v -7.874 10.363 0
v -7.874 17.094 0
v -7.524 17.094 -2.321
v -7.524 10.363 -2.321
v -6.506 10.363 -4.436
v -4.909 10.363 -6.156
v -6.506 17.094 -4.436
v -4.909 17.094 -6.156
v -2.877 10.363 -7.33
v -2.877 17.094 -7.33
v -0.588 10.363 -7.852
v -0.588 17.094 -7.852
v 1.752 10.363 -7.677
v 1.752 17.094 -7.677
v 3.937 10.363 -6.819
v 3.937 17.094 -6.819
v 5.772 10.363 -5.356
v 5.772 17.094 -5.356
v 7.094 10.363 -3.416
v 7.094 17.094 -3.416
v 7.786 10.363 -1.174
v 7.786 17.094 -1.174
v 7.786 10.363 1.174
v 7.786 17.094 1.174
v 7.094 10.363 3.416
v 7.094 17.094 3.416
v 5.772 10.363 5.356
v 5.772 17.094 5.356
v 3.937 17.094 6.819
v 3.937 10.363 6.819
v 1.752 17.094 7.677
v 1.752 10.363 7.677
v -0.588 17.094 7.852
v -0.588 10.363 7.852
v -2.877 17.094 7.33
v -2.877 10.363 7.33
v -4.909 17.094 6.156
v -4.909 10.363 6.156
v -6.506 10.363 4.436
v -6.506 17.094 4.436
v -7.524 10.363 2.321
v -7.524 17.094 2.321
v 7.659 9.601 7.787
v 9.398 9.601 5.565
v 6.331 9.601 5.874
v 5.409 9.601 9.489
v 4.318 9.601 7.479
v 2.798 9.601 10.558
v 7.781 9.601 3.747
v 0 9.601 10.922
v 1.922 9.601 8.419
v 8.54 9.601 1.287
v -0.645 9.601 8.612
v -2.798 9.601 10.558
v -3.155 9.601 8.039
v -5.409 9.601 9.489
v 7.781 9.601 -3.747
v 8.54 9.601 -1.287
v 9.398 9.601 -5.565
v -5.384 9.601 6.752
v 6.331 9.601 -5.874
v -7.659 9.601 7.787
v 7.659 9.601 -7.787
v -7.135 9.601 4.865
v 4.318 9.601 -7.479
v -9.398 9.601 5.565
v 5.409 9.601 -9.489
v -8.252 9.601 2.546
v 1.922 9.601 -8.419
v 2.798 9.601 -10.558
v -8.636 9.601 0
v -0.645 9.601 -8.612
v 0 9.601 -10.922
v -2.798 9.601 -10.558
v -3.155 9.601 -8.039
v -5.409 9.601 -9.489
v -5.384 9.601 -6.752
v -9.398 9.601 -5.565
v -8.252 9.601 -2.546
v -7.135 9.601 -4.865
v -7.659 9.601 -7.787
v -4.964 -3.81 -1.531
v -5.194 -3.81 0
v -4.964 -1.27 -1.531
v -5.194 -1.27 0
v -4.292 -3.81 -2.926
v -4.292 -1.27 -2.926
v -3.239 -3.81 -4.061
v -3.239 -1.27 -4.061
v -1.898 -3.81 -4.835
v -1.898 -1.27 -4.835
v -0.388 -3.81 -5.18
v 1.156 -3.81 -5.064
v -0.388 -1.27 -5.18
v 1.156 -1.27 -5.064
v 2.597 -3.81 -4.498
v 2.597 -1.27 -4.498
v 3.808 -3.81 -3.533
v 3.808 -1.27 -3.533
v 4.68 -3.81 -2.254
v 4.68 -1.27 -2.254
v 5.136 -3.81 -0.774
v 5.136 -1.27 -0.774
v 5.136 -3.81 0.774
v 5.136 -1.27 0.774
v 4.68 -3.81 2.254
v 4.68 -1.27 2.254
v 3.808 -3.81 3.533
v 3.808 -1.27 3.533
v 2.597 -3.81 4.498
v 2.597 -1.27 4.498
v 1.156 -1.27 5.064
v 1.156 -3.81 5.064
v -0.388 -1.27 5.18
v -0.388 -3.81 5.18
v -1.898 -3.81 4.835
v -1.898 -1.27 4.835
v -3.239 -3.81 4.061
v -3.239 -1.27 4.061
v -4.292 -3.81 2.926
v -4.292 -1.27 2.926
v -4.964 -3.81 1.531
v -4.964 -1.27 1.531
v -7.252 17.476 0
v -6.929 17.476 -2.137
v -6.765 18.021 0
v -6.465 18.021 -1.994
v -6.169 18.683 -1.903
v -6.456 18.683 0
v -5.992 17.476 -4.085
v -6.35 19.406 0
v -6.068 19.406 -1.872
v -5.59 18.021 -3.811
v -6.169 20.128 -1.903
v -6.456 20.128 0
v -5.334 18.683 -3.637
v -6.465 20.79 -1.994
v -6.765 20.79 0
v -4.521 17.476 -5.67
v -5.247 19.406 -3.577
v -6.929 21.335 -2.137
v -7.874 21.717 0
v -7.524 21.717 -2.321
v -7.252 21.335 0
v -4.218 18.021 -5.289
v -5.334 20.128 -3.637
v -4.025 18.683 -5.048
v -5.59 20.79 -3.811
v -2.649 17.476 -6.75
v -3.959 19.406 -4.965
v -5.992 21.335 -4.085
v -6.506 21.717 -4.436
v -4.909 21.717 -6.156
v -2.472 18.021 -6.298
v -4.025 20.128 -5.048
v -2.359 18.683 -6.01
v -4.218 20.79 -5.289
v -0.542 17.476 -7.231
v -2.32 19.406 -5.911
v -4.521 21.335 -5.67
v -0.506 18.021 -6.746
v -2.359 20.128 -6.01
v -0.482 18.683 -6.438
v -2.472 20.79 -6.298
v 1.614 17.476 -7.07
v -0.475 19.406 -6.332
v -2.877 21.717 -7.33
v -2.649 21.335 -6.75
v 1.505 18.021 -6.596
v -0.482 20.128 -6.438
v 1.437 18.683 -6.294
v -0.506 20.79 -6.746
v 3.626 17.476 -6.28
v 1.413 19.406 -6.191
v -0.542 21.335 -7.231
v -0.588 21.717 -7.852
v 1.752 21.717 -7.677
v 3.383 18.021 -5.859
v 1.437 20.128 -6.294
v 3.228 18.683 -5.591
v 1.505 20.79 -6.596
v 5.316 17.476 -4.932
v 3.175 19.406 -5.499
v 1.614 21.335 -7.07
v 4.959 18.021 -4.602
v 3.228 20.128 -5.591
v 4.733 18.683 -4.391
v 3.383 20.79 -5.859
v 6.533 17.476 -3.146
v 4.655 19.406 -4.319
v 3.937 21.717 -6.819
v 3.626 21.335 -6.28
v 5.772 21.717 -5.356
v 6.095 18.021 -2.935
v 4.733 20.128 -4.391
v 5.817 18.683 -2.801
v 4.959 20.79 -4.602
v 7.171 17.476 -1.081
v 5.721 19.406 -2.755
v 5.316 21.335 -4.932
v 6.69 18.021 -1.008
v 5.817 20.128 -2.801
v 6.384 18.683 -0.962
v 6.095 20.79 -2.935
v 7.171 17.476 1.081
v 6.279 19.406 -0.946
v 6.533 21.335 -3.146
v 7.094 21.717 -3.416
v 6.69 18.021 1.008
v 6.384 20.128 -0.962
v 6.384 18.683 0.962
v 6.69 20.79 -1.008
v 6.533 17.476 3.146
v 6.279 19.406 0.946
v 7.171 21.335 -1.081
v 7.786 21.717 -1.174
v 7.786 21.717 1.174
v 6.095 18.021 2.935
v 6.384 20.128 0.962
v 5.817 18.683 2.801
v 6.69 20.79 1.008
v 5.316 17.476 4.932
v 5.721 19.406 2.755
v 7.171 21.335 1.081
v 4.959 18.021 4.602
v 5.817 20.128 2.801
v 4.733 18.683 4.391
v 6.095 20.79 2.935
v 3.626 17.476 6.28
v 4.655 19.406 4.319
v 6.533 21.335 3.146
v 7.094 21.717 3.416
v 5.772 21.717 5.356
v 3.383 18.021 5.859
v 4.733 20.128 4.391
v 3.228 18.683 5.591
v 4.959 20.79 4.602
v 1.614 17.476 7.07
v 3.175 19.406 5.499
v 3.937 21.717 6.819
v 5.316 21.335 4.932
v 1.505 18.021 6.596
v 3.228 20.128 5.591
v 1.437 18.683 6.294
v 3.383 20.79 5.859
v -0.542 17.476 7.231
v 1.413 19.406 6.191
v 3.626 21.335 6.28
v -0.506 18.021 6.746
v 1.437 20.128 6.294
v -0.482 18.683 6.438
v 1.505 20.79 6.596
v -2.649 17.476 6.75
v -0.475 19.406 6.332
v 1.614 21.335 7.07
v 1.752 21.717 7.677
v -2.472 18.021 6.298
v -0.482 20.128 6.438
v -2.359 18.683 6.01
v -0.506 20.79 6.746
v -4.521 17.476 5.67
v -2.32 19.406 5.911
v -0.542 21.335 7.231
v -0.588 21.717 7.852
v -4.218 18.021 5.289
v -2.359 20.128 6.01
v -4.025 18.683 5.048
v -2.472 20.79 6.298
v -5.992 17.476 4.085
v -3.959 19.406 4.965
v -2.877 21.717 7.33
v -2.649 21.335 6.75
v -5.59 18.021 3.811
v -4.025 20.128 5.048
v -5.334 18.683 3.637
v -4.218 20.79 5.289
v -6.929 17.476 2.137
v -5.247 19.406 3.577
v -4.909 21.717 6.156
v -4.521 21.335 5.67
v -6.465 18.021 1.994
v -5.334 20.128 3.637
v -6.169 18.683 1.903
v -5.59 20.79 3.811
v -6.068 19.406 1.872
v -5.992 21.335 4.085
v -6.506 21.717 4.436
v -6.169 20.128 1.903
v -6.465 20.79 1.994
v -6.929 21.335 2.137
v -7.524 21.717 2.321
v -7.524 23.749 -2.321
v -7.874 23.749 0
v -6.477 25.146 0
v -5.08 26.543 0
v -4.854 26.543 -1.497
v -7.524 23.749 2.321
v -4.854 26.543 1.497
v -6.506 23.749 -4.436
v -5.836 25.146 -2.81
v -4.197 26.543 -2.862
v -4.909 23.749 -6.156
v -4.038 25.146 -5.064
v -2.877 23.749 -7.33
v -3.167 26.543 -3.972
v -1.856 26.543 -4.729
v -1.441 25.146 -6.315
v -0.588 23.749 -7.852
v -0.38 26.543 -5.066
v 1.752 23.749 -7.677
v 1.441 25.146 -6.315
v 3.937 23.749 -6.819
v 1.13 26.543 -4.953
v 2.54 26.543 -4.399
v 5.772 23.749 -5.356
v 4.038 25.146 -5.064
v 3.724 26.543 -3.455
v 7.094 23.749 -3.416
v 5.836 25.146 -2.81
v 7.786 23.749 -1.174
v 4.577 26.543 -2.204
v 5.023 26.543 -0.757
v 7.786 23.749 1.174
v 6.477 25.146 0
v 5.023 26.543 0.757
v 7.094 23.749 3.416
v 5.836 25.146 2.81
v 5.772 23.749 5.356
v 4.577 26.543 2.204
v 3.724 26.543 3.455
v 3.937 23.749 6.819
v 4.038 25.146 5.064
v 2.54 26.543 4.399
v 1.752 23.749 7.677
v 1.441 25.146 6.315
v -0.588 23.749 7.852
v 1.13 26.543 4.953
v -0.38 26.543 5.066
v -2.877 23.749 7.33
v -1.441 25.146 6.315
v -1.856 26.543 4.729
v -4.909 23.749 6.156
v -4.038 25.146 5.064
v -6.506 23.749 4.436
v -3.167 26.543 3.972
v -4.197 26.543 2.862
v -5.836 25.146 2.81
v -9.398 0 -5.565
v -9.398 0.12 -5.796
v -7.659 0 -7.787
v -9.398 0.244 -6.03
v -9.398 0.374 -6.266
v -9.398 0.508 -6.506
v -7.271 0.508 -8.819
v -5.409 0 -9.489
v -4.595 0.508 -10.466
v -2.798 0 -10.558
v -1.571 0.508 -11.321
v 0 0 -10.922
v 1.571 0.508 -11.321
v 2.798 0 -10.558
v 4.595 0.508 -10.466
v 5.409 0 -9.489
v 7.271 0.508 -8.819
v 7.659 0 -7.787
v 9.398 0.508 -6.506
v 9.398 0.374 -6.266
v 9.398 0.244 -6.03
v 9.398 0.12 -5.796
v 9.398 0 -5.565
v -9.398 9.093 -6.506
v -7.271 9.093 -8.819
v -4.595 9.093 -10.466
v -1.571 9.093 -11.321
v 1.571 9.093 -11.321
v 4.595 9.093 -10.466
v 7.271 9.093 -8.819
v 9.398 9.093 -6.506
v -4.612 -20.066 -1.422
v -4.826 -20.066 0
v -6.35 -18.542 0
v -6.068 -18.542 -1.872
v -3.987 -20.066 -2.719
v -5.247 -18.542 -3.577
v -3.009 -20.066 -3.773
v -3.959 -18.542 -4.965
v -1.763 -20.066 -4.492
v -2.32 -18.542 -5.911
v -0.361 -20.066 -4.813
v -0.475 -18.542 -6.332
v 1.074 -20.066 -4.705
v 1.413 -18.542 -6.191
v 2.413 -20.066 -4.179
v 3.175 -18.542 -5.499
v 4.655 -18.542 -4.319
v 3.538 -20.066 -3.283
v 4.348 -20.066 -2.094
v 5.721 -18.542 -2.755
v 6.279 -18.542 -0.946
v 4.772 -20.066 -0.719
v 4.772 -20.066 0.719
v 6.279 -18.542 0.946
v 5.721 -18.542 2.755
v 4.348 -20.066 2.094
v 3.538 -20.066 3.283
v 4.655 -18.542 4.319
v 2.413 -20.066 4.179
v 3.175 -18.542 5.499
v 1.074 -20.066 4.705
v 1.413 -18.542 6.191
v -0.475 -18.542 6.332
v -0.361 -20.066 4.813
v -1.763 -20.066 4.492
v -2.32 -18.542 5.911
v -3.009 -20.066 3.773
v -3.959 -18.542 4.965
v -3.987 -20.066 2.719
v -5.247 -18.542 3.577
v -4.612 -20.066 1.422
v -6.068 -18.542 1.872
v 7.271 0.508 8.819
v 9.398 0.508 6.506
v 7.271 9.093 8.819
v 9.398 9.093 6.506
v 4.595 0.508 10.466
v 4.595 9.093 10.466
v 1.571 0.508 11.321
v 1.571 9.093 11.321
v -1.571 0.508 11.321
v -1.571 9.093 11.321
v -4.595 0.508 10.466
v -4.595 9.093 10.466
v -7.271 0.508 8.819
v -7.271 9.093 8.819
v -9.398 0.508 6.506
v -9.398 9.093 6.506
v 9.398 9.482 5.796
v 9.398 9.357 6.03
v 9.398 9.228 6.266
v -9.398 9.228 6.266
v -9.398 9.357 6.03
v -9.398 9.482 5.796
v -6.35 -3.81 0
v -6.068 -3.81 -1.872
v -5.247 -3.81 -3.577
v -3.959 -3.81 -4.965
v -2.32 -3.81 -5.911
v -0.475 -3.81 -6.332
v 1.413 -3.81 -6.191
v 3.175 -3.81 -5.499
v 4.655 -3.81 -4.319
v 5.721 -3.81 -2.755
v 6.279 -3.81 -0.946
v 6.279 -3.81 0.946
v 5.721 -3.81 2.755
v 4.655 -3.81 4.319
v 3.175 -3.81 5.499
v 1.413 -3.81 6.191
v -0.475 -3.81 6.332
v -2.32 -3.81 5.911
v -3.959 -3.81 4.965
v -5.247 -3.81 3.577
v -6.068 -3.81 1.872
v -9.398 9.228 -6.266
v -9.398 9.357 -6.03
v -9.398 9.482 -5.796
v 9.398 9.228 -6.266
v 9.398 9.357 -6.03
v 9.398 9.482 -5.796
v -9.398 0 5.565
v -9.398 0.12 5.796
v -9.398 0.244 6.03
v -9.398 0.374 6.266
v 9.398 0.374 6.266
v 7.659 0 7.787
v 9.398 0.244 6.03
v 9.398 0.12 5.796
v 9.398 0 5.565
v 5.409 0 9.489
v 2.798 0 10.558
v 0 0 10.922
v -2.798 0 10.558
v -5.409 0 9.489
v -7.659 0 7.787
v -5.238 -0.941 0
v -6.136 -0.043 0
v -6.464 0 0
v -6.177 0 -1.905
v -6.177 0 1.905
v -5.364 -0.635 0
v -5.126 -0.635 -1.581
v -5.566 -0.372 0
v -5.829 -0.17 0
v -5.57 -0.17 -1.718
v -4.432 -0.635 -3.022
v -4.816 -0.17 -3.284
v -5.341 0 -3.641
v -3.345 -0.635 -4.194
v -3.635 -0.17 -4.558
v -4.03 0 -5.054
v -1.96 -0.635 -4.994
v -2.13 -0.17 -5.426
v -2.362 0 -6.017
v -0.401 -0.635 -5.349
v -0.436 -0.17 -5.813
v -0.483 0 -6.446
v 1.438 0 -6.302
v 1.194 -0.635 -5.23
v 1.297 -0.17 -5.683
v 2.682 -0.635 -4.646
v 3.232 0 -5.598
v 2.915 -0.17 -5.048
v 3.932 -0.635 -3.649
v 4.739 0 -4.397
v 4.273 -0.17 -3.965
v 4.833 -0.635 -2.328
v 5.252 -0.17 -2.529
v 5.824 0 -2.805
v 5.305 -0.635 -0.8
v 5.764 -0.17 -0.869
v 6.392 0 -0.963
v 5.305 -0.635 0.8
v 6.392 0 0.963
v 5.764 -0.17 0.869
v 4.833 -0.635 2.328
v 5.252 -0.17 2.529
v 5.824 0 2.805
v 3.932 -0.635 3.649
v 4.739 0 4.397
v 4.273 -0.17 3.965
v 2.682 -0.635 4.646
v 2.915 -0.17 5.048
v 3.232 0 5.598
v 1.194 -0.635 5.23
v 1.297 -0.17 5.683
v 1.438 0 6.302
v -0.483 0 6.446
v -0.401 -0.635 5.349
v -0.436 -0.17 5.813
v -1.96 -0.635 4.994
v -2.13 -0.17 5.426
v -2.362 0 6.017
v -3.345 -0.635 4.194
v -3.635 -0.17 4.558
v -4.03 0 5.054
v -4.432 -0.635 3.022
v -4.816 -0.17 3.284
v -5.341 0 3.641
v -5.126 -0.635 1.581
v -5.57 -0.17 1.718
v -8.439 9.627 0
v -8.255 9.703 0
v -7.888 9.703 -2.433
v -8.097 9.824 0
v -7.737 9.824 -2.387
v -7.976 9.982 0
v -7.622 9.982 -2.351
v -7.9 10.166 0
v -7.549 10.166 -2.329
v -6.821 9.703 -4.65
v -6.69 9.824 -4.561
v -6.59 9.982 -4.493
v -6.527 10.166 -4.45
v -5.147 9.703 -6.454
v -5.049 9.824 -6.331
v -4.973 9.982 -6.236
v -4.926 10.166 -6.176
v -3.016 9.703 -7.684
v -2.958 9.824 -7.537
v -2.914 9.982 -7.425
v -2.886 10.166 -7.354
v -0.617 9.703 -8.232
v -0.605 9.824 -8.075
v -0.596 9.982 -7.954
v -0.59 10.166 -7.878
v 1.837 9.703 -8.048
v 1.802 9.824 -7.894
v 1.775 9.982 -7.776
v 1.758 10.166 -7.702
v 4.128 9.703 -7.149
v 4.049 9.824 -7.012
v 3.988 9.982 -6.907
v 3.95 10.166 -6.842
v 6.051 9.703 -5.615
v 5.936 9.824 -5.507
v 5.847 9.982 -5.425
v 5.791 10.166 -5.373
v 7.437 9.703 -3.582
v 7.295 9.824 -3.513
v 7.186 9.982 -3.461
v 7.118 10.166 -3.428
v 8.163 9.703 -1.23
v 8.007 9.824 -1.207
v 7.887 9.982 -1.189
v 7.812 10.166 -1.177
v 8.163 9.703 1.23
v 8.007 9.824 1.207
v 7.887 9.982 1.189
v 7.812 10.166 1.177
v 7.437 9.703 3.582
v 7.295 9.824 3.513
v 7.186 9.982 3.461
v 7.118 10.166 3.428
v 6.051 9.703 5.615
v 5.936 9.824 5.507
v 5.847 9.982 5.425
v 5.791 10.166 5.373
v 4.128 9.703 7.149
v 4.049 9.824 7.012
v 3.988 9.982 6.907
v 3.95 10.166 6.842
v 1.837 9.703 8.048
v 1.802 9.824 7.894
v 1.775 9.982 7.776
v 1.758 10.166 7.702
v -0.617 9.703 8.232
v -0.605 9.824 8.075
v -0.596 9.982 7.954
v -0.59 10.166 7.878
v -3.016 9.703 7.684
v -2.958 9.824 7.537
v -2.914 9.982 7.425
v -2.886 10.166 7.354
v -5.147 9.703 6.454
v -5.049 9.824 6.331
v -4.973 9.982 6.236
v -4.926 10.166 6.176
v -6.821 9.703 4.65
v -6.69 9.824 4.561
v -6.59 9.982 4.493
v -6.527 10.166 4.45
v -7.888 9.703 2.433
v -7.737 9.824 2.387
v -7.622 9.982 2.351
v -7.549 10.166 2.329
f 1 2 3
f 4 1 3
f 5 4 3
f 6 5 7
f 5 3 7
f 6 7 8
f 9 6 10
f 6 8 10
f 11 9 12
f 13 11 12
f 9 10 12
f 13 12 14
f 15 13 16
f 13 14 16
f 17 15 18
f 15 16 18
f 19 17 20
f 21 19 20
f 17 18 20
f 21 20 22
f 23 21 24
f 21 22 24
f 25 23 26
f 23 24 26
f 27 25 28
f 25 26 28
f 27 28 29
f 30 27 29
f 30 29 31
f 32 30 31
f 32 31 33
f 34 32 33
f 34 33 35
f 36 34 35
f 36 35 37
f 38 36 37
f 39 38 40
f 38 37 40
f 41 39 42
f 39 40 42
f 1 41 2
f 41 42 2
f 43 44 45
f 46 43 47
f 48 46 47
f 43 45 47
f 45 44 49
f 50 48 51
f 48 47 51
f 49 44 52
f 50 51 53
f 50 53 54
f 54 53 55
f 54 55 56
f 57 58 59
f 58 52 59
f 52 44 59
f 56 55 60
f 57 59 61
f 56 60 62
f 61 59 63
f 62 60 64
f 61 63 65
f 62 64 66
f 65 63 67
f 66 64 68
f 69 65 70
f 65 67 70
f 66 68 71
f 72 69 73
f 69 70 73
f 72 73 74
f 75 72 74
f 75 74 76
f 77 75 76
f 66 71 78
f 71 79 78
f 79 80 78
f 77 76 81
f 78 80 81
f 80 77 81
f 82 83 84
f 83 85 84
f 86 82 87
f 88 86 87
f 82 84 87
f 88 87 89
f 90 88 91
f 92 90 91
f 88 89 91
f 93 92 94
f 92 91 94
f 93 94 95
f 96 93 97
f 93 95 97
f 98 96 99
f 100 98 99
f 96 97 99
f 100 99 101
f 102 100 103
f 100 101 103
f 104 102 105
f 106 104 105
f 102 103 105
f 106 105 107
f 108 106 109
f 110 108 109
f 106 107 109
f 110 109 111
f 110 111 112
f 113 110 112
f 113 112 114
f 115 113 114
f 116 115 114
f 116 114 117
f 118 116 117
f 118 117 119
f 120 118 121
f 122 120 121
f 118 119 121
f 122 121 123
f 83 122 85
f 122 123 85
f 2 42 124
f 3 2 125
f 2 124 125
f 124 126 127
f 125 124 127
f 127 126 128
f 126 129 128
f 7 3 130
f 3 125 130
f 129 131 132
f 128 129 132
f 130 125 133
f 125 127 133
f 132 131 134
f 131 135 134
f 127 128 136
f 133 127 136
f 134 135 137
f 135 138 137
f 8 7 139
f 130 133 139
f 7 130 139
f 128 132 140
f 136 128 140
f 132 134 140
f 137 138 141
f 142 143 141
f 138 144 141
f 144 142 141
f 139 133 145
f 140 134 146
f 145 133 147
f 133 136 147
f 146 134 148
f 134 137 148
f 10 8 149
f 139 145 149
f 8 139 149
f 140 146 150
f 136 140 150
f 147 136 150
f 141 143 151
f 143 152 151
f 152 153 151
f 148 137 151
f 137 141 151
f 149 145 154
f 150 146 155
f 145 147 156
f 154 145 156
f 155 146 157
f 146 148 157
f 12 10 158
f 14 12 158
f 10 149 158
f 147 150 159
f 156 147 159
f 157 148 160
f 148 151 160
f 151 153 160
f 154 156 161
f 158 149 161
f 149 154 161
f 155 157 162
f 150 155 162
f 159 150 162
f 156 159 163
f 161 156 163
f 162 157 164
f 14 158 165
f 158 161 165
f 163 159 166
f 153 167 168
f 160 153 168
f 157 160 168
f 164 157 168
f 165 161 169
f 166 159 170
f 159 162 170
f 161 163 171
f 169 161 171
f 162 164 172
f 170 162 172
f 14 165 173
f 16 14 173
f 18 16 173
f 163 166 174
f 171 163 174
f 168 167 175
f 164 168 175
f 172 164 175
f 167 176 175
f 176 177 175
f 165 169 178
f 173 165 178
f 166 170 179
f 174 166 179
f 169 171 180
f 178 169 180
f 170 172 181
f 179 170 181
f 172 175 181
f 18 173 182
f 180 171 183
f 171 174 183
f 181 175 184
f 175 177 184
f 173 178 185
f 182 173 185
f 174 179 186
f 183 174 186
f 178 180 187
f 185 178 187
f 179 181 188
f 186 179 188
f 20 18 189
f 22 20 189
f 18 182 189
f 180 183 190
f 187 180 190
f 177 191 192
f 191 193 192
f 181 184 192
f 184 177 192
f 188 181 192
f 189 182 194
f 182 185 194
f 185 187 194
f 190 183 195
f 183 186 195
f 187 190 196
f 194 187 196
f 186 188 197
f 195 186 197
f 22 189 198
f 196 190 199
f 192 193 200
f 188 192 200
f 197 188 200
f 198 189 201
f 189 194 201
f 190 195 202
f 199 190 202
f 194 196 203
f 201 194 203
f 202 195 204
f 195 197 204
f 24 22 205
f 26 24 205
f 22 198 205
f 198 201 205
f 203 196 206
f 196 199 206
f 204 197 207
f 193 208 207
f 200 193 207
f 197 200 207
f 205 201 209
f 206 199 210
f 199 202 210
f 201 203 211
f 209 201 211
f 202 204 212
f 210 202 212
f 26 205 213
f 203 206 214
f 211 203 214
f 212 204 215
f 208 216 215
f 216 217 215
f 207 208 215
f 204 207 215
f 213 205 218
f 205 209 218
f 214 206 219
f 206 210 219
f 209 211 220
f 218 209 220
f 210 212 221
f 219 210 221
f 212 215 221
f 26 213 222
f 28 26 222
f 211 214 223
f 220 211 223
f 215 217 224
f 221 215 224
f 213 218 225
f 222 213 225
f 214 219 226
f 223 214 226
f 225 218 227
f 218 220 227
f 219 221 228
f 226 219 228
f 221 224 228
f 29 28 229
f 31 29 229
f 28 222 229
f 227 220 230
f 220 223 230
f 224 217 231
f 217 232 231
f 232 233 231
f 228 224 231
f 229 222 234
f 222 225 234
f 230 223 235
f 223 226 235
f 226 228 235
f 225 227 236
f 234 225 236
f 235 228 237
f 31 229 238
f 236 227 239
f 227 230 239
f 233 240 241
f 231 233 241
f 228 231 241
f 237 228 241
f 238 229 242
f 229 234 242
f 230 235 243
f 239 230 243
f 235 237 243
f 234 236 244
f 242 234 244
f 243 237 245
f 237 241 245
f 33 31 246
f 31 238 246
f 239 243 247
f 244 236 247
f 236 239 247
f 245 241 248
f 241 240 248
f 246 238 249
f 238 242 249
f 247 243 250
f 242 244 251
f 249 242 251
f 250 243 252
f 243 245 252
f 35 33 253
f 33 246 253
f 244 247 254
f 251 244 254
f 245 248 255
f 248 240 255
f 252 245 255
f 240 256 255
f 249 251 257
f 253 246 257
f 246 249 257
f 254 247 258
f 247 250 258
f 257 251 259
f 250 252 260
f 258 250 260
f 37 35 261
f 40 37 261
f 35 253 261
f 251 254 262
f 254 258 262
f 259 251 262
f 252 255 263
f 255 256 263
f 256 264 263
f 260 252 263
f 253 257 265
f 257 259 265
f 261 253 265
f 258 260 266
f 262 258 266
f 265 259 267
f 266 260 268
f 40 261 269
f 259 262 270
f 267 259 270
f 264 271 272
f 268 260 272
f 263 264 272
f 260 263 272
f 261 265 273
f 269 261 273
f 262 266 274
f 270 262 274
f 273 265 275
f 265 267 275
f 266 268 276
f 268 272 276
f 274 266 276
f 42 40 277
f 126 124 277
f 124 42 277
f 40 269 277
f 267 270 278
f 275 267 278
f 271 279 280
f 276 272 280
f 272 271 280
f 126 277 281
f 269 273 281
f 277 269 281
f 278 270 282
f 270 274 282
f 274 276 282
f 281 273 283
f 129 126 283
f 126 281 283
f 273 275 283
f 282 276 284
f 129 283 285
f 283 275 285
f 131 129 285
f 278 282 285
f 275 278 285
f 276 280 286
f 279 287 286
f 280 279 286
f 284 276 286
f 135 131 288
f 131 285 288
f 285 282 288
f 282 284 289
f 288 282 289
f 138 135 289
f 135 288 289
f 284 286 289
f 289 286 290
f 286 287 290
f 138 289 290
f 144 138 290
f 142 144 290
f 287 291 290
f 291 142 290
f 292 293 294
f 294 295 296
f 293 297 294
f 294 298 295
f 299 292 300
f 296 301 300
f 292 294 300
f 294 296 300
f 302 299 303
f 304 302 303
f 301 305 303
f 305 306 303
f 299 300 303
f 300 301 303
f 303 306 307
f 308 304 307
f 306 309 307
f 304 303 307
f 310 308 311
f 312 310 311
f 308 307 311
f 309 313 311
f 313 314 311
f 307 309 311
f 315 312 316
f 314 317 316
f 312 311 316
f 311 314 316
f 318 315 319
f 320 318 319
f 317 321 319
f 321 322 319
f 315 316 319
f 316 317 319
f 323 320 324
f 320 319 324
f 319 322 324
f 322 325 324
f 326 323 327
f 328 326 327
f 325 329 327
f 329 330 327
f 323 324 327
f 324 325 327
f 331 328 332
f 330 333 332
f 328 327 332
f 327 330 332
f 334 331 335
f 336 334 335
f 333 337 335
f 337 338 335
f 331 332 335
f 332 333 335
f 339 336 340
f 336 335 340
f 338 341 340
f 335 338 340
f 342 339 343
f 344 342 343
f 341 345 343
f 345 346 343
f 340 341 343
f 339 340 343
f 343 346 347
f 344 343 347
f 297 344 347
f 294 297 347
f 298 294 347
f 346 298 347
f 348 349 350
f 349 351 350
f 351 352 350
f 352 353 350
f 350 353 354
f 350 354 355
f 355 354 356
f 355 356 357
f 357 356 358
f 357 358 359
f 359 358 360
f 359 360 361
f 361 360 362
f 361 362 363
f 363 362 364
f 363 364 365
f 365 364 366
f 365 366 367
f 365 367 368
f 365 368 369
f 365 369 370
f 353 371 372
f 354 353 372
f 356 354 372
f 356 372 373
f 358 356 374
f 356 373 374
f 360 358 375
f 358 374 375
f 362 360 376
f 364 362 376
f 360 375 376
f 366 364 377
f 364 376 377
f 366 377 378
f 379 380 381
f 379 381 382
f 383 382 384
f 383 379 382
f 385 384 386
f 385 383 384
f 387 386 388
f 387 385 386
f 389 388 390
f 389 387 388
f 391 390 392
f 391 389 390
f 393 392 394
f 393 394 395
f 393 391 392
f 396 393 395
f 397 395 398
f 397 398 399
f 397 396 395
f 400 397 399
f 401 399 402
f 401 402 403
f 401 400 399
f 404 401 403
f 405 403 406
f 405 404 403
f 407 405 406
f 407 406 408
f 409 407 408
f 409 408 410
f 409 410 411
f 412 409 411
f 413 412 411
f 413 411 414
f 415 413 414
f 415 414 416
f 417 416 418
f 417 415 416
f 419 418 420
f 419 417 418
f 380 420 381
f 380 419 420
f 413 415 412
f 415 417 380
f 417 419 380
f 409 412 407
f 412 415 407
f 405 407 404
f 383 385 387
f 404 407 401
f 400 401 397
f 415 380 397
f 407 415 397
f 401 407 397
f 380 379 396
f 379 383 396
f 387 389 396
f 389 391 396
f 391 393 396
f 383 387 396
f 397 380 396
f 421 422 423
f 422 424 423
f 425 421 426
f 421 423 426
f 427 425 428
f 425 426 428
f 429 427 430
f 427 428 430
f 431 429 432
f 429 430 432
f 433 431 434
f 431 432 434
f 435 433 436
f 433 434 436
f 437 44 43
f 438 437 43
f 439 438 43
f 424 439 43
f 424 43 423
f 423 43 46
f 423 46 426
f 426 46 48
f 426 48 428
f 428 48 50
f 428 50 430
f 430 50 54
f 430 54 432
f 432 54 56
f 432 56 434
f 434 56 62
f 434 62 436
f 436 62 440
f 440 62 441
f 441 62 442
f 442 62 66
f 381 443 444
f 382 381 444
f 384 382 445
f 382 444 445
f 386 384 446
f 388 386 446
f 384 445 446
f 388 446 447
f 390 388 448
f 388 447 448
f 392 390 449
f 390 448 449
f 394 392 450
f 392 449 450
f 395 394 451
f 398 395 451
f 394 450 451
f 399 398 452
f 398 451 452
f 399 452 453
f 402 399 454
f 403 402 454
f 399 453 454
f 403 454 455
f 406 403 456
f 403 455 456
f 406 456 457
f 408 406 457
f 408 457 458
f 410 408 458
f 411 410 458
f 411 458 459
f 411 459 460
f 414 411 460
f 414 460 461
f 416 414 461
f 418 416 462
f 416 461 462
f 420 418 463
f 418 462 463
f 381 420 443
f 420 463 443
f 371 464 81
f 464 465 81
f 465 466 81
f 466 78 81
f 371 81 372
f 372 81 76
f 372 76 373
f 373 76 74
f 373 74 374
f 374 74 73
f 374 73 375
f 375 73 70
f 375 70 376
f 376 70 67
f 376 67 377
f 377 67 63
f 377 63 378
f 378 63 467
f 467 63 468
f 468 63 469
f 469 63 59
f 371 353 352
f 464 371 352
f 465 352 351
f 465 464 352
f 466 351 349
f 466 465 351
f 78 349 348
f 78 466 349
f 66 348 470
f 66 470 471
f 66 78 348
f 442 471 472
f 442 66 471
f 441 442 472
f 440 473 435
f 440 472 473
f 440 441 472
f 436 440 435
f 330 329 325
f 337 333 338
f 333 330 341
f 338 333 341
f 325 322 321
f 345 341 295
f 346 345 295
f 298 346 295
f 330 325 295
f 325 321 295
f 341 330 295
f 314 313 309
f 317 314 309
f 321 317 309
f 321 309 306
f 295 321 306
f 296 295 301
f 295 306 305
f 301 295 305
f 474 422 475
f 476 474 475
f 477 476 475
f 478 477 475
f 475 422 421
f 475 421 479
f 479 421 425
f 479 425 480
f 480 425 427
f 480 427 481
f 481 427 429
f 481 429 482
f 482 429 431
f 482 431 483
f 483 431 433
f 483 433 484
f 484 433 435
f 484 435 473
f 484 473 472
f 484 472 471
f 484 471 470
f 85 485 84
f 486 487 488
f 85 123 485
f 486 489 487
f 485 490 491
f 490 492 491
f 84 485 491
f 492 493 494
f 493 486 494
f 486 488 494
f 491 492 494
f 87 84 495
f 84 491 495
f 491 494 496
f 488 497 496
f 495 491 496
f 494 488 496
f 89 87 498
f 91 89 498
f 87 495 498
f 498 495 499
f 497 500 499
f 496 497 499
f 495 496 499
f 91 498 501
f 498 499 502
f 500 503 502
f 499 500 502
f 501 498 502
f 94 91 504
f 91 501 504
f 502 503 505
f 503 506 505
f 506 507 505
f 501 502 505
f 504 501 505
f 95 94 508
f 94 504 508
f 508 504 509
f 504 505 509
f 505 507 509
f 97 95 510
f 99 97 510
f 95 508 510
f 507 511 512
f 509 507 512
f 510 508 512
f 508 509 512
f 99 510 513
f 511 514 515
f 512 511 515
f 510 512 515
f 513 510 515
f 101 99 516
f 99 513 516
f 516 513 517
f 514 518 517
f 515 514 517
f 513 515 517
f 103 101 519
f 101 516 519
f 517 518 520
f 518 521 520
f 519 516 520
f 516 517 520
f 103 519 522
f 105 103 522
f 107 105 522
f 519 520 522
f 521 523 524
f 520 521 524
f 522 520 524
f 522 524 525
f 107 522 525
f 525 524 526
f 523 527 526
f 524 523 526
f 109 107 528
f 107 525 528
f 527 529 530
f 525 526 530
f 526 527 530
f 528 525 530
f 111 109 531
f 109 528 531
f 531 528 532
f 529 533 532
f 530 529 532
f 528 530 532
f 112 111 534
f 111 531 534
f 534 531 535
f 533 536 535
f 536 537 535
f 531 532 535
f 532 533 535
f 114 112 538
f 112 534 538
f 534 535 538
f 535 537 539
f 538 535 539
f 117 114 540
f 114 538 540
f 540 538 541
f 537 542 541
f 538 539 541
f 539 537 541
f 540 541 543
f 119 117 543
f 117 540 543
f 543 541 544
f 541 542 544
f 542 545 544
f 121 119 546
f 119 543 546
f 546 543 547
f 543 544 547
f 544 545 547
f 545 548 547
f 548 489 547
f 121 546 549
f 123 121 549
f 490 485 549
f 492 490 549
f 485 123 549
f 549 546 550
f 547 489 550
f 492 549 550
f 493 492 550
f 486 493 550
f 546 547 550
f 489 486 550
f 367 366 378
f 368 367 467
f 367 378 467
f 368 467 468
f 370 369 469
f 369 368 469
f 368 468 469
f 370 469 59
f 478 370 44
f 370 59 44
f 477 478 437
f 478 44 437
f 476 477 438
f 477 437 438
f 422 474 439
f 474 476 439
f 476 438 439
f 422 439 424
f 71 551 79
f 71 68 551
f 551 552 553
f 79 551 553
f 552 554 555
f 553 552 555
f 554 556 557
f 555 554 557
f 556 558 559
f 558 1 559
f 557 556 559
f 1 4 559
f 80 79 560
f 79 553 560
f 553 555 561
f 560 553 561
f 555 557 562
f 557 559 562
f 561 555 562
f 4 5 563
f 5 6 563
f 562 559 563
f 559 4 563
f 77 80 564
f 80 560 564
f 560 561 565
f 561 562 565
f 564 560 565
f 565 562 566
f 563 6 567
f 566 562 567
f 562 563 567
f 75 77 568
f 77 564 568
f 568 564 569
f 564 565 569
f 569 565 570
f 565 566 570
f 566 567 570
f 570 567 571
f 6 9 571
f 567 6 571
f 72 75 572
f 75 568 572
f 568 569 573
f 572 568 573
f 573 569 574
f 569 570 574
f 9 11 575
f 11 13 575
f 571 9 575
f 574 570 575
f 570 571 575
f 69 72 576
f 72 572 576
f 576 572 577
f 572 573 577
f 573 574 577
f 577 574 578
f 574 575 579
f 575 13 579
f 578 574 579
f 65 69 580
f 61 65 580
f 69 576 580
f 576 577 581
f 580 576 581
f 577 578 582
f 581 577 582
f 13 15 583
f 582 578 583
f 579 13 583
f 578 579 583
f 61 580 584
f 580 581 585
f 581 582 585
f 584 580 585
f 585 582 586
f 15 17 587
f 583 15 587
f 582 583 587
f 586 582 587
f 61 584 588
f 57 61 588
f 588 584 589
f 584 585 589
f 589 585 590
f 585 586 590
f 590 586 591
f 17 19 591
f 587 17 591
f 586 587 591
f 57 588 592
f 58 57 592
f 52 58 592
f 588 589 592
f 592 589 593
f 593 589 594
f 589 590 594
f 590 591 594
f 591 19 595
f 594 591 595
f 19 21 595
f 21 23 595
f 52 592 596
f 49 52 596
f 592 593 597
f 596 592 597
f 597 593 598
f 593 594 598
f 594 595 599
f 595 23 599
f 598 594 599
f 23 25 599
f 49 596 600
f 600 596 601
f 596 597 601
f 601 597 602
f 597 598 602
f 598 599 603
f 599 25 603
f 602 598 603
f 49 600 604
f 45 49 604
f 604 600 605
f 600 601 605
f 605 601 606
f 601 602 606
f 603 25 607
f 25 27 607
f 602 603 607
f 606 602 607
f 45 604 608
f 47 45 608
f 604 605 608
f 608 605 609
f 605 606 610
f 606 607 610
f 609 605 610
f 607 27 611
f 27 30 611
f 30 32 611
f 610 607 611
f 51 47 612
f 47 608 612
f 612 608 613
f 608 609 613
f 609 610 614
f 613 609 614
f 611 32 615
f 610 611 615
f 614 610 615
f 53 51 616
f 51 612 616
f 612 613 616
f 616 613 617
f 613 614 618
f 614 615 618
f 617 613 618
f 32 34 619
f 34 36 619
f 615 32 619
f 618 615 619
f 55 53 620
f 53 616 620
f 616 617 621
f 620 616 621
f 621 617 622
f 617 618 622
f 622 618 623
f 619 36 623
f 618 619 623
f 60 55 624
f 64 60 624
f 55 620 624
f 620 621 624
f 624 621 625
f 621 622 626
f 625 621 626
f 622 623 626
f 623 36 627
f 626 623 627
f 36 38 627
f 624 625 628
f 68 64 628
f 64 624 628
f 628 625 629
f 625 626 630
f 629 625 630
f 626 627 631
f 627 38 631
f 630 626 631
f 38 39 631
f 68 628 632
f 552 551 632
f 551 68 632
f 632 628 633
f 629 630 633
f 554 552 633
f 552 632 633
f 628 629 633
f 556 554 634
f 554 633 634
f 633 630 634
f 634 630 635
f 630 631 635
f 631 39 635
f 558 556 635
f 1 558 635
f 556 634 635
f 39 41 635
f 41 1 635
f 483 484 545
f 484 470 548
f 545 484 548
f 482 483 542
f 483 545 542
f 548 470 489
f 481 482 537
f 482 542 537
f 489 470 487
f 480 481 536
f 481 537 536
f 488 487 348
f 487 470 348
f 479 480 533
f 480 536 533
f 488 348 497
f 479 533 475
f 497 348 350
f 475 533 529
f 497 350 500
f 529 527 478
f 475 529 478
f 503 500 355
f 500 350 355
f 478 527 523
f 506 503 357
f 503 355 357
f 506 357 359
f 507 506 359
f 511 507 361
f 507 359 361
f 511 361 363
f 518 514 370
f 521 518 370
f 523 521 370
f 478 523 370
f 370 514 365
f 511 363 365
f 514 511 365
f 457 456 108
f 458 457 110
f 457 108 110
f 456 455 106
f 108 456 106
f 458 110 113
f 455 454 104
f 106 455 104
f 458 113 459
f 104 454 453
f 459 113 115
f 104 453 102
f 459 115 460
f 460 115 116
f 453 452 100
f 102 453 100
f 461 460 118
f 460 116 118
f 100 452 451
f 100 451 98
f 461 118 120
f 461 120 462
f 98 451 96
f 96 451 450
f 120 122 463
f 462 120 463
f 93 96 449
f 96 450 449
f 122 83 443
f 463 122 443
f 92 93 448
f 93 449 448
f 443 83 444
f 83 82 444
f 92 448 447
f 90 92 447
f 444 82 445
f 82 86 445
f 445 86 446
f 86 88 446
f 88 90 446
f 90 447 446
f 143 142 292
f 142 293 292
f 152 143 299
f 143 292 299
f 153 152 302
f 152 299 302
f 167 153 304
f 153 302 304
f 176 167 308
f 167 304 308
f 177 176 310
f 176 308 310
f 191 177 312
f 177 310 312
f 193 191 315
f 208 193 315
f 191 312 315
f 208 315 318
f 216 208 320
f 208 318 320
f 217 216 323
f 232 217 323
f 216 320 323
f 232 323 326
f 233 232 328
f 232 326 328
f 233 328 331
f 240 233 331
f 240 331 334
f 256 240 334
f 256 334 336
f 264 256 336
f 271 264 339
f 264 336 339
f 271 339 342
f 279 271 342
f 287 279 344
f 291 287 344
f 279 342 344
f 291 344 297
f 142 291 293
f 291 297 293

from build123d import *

# Parameters (mm, degrees)
CHAMFER1_SIZE      = 0.508
CHAMFER2_SIZE      = 1.524
CUT_EXTRUDE1_DEPTH = 30.6672
FILLET1_R          = 0.762


with BuildPart() as part:
    # Sketch1 → Revolve1 (revolve)
    with BuildSketch(Plane.XY):
        with BuildLine():
            Line((0, 26.543), (0, -20.066))
            Line((0, -20.066), (-6.35, -20.066))
            Line((-6.35, -20.066), (-6.35, -3.81))
            Line((-6.35, -3.81), (-5.1943, -3.81))
            Line((-5.1943, -3.81), (-5.1943, -1.27))
            ThreePointArc((-5.1943, -1.27), (-5.566274388, -0.371974388), (-6.4643, 0))
            Line((-6.4643, 0), (-11.43, 0))
            Line((-11.43, 0), (-11.43, 9.6012))
            Line((-11.43, 9.6012), (-7.874, 9.6012))
            Line((-7.874, 9.6012), (-7.874, 17.0942))
            ThreePointArc((-7.874, 17.0942), (-6.35, 19.4056), (-7.874, 21.717))
            Line((-7.874, 21.717), (-7.874, 23.749))
            Line((-7.874, 23.749), (-5.08, 26.543))
            Line((-5.08, 26.543), (0, 26.543))
        make_face()
    revolve(axis=Axis((0, -20.066, 0), (0, -1, 0)))

    # Chamfer1
    chamfer1_edges = [part.edges().sort_by_distance(p)[0] for p in [
        (11.43, 9.6012, 0),
        (11.43, 0, 0),
    ]]
    chamfer(chamfer1_edges, length=CHAMFER1_SIZE)

    # Chamfer2
    chamfer2_edges = [part.edges().sort_by_distance(p)[0] for p in [
        (6.35, -20.066, 0),
    ]]
    chamfer(chamfer2_edges, length=CHAMFER2_SIZE)

    # Sketch2 → Cut-Extrude1 (cut, through all)
    with BuildSketch(Plane(origin=(0, 9.6012, 0), x_dir=(1, 0, 0), z_dir=(0, 1, 0))):
        with BuildLine():
            Line((-9.398, 6.505574225), (-9.398, -6.505574225))
            ThreePointArc((-9.398, -6.505574225), (-11.43, 0), (-9.398, 6.505574225))
        make_face()
        with BuildLine():
            Line((9.398, 6.505574225), (9.398, -6.505574225))
            ThreePointArc((9.398, -6.505574225), (11.43, 0), (9.398, 6.505574225))
        make_face()
    extrude(amount=-CUT_EXTRUDE1_DEPTH, mode=Mode.SUBTRACT)

    # Fillet1
    fillet1_edges = [part.edges().sort_by_distance(p)[0] for p in [
        (7.874, 9.6012, 0),
    ]]
    fillet(fillet1_edges, radius=FILLET1_R)


solid = part.part
